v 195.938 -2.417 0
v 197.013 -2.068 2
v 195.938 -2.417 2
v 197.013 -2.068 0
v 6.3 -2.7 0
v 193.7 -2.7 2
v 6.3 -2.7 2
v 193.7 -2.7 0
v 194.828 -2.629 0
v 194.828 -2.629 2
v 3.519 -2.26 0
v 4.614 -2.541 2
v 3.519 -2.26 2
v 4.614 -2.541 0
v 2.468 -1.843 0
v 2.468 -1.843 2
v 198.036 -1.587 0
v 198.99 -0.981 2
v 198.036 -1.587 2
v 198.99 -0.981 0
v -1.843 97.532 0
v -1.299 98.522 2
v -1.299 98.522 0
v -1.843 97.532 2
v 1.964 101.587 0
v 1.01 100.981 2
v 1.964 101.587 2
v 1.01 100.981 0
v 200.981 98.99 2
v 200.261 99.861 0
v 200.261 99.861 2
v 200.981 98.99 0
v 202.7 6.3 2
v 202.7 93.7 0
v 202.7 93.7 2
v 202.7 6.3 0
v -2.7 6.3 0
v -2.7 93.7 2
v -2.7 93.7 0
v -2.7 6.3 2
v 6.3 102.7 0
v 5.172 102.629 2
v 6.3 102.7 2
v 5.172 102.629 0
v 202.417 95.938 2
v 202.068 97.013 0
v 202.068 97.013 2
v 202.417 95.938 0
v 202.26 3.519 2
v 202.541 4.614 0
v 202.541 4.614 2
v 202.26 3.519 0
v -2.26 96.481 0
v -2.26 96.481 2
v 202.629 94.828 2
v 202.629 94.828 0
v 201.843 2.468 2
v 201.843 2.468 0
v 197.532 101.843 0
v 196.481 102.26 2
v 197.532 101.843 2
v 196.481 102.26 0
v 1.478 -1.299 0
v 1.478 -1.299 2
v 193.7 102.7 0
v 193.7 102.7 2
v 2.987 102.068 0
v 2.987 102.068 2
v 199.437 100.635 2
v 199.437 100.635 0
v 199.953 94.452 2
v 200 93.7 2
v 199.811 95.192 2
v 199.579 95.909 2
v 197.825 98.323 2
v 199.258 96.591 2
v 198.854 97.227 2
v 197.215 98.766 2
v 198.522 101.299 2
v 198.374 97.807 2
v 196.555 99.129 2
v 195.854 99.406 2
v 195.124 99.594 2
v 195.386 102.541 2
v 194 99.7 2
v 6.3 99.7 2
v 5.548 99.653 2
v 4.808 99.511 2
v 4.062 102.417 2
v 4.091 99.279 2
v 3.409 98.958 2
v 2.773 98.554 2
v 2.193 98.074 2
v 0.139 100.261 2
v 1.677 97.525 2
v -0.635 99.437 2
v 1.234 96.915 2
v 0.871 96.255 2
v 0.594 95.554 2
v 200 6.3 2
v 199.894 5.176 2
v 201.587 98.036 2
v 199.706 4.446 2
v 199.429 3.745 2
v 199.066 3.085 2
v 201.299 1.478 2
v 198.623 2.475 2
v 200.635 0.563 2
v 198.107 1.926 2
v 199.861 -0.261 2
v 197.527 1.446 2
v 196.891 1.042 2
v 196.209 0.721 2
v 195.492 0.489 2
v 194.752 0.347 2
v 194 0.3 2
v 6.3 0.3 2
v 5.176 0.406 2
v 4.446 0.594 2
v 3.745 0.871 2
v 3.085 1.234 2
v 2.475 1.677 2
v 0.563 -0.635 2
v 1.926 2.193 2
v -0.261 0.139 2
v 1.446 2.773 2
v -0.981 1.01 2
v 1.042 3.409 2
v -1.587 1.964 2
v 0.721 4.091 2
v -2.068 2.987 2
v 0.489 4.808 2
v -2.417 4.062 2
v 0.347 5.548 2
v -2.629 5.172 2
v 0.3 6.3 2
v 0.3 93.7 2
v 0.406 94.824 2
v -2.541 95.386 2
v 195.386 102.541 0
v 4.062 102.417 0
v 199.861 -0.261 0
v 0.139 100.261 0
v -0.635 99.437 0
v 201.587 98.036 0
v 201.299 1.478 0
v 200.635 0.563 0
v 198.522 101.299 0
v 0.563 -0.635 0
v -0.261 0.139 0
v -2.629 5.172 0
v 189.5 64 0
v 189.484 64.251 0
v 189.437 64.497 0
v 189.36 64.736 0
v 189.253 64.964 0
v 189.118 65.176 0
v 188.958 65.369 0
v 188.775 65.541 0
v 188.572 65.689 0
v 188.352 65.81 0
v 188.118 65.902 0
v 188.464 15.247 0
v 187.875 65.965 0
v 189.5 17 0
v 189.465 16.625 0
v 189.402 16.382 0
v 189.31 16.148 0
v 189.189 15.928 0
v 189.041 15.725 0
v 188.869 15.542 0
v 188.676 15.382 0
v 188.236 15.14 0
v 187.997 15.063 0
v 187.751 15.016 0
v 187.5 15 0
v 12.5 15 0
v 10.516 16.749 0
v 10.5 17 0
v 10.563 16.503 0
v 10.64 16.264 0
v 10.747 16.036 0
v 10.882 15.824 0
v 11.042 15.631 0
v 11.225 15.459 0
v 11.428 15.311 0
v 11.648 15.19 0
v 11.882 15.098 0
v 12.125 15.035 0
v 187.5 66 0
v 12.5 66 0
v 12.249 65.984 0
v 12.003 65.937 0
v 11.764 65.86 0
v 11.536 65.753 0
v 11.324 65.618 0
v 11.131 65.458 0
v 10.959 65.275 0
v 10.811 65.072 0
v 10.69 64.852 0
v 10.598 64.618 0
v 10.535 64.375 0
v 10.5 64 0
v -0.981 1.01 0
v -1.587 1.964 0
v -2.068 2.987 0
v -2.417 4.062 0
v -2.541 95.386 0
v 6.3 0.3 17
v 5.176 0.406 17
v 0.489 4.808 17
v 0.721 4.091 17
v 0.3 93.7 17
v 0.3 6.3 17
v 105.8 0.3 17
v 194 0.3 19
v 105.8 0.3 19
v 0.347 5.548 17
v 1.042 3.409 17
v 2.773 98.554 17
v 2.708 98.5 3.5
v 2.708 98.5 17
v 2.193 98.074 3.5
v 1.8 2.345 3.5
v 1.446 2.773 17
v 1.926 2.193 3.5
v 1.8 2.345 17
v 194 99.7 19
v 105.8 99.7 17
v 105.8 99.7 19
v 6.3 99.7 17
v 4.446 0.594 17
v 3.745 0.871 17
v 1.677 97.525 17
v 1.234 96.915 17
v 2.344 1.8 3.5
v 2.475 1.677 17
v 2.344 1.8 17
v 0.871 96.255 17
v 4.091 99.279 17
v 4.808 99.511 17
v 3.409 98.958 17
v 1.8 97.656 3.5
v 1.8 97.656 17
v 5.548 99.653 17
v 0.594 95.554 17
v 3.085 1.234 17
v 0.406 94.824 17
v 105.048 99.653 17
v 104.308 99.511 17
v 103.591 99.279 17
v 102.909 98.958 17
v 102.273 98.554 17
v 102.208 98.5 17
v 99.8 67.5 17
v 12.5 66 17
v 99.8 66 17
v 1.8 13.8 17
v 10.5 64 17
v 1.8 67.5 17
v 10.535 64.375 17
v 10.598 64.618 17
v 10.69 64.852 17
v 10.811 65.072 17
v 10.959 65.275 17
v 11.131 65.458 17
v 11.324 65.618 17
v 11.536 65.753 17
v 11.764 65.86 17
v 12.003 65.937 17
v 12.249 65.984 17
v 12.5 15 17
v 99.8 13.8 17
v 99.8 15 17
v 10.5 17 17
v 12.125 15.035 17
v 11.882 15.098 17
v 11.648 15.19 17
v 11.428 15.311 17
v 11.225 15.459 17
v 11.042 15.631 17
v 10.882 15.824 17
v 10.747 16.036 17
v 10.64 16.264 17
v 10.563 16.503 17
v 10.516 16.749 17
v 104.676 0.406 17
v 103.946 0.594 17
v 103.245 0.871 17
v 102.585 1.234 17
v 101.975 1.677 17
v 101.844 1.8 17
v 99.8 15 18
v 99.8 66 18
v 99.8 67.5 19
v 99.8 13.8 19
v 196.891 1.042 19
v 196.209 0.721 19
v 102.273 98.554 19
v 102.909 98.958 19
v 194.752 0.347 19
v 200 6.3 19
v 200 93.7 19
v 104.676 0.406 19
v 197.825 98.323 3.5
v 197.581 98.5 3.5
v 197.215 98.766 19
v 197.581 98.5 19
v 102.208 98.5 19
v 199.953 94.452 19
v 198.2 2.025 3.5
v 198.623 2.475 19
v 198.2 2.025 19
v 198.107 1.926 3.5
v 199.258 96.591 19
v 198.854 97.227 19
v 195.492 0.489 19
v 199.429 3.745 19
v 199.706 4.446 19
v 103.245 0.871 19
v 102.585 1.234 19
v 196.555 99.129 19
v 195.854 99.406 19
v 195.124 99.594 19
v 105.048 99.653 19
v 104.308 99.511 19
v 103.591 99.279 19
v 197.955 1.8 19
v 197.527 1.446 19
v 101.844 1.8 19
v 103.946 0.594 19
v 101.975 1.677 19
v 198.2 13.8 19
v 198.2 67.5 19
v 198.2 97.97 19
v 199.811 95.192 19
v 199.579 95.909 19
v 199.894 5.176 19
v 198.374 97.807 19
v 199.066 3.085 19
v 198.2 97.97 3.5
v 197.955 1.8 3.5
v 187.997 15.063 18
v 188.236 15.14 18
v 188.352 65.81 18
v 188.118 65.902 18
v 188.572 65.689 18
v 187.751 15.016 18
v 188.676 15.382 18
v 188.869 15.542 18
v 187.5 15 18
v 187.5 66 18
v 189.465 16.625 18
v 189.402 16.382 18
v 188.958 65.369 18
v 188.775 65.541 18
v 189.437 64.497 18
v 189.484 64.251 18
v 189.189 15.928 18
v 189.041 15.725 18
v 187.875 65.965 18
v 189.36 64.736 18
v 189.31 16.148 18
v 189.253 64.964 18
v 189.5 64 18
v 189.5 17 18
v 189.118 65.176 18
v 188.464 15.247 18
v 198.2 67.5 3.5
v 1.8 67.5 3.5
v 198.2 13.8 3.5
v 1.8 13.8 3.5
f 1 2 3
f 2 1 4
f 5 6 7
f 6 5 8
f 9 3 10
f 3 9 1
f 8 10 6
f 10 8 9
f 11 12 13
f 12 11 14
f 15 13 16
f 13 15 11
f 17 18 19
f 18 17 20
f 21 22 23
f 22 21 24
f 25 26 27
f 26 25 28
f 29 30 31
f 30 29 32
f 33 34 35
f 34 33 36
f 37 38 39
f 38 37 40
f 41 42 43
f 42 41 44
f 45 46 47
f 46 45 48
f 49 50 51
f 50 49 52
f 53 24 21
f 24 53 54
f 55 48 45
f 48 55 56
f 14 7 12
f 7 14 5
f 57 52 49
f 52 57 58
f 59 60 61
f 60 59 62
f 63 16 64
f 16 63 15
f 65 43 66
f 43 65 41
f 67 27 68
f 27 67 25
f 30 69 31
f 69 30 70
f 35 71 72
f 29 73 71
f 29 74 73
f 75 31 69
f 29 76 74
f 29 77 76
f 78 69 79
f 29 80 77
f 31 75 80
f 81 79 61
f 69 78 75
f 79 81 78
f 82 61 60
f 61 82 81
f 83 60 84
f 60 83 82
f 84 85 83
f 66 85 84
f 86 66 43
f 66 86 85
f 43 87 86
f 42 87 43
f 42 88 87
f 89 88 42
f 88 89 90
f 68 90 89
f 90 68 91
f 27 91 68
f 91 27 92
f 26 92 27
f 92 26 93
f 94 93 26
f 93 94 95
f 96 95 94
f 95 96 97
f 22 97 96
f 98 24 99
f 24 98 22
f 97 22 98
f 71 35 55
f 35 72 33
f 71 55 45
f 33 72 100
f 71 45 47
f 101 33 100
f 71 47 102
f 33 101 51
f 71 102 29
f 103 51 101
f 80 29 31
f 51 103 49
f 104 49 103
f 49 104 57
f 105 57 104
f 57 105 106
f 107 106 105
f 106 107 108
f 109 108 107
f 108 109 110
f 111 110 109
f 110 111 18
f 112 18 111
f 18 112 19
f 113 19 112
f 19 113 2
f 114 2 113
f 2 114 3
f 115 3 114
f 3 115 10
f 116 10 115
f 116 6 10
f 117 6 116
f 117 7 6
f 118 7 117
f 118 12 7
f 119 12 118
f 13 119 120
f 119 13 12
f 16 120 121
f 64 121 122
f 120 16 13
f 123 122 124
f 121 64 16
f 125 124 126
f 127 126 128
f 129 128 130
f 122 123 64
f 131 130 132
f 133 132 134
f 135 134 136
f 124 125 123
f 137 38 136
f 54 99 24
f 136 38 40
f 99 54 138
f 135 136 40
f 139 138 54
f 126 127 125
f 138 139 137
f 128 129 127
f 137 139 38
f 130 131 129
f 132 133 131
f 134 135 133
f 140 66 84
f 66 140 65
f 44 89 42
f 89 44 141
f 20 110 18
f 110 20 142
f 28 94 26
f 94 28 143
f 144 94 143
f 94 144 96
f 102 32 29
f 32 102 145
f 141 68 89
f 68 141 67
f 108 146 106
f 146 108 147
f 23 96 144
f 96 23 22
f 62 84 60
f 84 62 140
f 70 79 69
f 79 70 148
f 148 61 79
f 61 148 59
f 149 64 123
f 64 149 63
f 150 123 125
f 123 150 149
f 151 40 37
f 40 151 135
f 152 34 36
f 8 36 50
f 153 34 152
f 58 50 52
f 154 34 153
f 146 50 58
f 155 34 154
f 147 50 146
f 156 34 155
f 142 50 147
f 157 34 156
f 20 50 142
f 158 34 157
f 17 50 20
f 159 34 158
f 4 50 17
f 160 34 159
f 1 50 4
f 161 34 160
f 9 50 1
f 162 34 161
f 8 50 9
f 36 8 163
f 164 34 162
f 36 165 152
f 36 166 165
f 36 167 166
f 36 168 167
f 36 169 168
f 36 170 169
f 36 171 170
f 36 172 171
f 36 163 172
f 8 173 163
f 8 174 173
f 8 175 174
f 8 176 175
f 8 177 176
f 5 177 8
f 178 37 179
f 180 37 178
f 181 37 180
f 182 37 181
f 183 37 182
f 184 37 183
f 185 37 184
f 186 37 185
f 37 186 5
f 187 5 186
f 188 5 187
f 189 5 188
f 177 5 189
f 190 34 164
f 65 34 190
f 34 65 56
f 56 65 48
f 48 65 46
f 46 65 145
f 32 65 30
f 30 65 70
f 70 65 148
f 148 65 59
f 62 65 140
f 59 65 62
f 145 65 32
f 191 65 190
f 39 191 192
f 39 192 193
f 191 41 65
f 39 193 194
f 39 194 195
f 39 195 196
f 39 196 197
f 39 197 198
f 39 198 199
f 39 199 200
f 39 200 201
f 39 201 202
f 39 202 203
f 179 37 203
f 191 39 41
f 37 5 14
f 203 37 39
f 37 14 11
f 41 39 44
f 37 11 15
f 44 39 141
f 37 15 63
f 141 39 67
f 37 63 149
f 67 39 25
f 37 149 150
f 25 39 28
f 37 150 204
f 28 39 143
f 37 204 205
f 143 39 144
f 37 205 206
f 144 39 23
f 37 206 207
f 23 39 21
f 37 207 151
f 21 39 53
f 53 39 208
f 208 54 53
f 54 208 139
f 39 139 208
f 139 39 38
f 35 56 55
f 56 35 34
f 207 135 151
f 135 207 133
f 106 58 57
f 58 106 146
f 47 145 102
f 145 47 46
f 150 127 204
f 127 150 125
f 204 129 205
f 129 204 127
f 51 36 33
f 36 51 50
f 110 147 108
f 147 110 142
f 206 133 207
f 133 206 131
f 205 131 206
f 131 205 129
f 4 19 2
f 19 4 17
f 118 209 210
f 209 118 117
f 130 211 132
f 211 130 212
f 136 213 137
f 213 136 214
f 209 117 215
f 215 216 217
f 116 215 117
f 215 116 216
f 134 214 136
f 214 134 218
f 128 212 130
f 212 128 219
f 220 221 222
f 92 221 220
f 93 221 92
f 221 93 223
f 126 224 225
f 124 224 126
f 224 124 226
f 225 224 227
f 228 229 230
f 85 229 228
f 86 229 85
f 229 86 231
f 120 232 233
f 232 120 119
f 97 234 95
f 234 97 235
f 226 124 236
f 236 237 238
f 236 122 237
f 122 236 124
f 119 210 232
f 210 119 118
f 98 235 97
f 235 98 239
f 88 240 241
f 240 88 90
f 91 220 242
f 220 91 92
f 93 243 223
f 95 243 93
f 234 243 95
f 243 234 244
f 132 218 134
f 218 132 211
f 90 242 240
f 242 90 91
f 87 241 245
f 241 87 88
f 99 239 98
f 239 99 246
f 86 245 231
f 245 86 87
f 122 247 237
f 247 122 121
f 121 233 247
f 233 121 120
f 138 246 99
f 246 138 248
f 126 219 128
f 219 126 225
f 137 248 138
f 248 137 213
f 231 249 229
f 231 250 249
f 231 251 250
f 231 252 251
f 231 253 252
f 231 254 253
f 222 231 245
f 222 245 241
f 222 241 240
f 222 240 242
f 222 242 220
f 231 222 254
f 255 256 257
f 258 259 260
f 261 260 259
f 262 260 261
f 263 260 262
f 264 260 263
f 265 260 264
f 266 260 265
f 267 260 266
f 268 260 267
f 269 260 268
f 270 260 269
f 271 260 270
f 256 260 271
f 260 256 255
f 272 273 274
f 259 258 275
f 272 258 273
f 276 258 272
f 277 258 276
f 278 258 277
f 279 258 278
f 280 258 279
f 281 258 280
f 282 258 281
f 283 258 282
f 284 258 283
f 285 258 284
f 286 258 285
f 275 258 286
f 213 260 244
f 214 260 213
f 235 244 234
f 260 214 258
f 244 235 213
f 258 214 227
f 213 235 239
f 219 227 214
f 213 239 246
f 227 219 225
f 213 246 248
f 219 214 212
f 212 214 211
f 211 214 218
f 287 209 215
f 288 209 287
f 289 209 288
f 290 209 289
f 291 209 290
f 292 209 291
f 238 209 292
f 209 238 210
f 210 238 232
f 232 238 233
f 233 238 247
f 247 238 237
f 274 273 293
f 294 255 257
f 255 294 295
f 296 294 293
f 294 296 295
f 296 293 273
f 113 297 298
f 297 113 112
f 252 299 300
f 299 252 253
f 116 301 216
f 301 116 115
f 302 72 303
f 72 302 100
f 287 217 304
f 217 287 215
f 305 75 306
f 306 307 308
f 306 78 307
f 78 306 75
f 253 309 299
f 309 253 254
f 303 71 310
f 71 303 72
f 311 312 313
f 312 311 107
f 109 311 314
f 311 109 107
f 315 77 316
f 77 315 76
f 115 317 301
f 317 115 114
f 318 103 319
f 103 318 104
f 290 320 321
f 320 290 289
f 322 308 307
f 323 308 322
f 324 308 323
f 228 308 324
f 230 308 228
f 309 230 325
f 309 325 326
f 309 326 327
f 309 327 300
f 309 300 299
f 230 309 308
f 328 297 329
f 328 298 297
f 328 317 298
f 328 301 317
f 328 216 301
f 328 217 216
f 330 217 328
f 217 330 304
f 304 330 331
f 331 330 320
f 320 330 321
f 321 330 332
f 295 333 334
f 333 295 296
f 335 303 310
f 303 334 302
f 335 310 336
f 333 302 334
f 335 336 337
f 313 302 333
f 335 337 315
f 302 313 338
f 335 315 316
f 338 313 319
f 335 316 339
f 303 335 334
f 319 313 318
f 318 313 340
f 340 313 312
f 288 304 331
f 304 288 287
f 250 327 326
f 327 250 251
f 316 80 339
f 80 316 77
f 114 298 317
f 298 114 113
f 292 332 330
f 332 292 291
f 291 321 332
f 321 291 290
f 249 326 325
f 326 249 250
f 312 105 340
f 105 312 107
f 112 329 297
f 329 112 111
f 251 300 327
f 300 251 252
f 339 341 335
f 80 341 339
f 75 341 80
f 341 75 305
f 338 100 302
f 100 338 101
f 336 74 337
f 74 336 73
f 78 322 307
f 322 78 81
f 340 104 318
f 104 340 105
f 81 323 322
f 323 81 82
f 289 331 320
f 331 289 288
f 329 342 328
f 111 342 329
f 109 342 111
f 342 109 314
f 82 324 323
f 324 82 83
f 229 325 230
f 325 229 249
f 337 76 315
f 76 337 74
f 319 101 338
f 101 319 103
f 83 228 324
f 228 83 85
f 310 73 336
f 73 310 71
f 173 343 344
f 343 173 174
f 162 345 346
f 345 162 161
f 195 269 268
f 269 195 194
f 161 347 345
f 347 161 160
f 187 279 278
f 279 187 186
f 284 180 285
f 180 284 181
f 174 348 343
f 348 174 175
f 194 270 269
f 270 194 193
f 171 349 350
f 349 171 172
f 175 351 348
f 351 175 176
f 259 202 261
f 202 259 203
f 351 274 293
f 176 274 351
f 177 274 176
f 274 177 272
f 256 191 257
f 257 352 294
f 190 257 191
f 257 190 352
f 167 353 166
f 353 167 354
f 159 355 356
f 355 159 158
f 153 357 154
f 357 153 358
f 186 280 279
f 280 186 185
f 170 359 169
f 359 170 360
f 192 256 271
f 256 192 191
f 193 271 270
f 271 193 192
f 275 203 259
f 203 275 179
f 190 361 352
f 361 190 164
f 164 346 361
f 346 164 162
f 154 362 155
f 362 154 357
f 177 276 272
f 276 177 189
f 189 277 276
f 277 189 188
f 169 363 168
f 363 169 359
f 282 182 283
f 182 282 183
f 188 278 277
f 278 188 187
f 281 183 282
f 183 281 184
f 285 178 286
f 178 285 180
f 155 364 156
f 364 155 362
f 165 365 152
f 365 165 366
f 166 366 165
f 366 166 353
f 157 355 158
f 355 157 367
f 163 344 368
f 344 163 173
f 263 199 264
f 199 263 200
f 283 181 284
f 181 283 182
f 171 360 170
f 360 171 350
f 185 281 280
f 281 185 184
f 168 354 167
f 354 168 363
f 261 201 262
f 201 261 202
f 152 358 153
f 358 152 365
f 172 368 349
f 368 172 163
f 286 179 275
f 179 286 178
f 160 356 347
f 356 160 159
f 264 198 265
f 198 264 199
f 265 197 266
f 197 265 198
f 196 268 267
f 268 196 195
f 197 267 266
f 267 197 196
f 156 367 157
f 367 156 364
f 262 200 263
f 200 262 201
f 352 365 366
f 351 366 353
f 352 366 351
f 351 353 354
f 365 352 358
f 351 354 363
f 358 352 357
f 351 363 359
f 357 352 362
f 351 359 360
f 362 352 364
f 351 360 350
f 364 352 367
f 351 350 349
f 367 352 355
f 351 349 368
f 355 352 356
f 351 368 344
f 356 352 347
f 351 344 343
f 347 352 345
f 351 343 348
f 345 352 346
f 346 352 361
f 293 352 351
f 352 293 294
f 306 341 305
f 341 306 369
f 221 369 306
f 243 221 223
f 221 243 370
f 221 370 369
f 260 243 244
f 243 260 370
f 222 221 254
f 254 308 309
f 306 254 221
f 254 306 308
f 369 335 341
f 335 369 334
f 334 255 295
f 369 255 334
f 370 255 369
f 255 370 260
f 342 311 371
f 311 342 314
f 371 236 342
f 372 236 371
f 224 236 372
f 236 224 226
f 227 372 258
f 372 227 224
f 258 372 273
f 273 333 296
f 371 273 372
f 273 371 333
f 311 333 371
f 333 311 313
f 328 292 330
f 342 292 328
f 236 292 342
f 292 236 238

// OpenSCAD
// Prado 2018 Radio Trim v5 — TEST FIT with L-shape fill
// Corrected from real test fit measurements (2026-03-11)
//
// Key corrections from v4 test fit:
// - Fascia opening: 200 × 100mm (not 205 × 104)
// - Body width: ~180mm (channel behind fascia is standard DIN width)
// - L-shaped side wings hug the Sony bracket (asymmetric left/right)
// - Body depth: max 15mm (before cavity widens)
// - din_y = 15mm (confirmed perfect)
// - Dash angle = 24° (measured, but kept flat for test fit)
//
// Print: flange face DOWN, 2 perimeters, 10% infill, ~30-40min

// ── Fascia Opening Dimensions ────────────────────────────────

// The actual opening in the gloss black fascia
fascia_w = 200;       // Confirmed: Aerpro FP9105 = 201mm, client = 20cm
fascia_h = 100;       // Confirmed: Aerpro FP9105 = 101mm, client = ~10cm

// Corner radius on fascia opening
fascia_r = 6;         // Reduced from 8mm — smaller opening means tighter radius

// ── DIN Cutout (Sony chassis hole) ───────────────────────────

din_w = 179;          // Sony 178mm + 1mm clearance
din_h = 51;           // Sony 50mm + 1mm clearance
din_r = 2;

// DIN position (measured from bottom-left of fascia opening)
din_x = (fascia_w - din_w) / 2;   // ~10.5mm centered
din_y = 15;                        // Confirmed perfect from test fit

// ── L-Shaped Side Fill (hugs Sony bracket) ───────────────────
// These fill the step between the narrow DIN area and the wide fascia opening
// Measured at the car — ASYMMETRIC left vs right

// Left side L-shape
l_shelf_w = 22;       // Horizontal shelf width (mm)
l_shelf_d = 15;       // Vertical depth of the shelf (mm)

// Right side L-shape
r_shelf_w = 23;       // Horizontal shelf width (mm)
r_shelf_d = 17;       // Vertical depth of the shelf (mm)

// ── Body Dimensions ──────────────────────────────────────────

body_depth = 15;      // Max depth before cavity widens (measured 1.5cm)
flange_overhang = 3;  // Reduced — fascia opening is tighter
flange_t = 2;         // Flange thickness (test fit = thin)

wall = 1.5;           // Thin walls for test fit
tol = 0.3;            // Tighter tolerance for better fit test

// ── Modules ──────────────────────────────────────────────────

$fn = 50;

module rounded_rect_2d(w, h, r) {
    offset(r) offset(-r)
        square([w, h]);
}

// ── Main Trim ────────────────────────────────────────────────

module trim_v5() {

    // Calculate inner body width (channel behind fascia)
    // The body that slides in is narrower than the fascia opening
    // It matches the space between the L-shelf inner edges
    body_w = fascia_w - l_shelf_w - r_shelf_w;  // 200 - 22 - 23 = 155mm
    body_h = fascia_h;  // Full height for now

    // Body X offset (left shelf pushes body to the right)
    body_x = l_shelf_w;

    difference() {
        union() {
            // ── 1. Front flange (sits on fascia surface) ──
            translate([-(flange_overhang - tol), -(flange_overhang - tol), 0])
            linear_extrude(flange_t)
                rounded_rect_2d(
                    fascia_w + flange_overhang*2 - tol*2,
                    fascia_h + flange_overhang*2 - tol*2,
                    fascia_r + flange_overhang
                );

            // ── 2. Face plate (fills the fascia opening) ──
            // This is the visible front face, full fascia width
            translate([tol, tol, flange_t])
            linear_extrude(wall)  // Just one wall thickness deep
                rounded_rect_2d(fascia_w - tol*2, fascia_h - tol*2, fascia_r);

            // ── 3. Narrow body (slides into the channel) ──
            // Only the narrow center section goes deep
            translate([body_x + tol, tol, flange_t])
            linear_extrude(body_depth)
                rounded_rect_2d(body_w - tol*2, body_h - tol*2, 2);

            // ── 4. Left L-shaped wing ──
            // Horizontal shelf: extends from body left edge toward fascia left edge
            // Depth: l_shelf_d (15mm)
            translate([tol, tol, flange_t])
            linear_extrude(l_shelf_d)
                rounded_rect_2d(l_shelf_w + body_w/2, fascia_h - tol*2, fascia_r);

            // ── 5. Right L-shaped wing ──
            // Horizontal shelf: extends from body right edge toward fascia right edge
            // Depth: r_shelf_d (17mm)
            translate([body_x + body_w/2 + tol, tol, flange_t])
            linear_extrude(r_shelf_d)
                rounded_rect_2d(r_shelf_w + body_w/2 - tol, fascia_h - tol*2, fascia_r);
        }

        // ── DIN cutout (all the way through) ──
        translate([din_x, din_y, -1])
        linear_extrude(body_depth + flange_t + 2)
            rounded_rect_2d(din_w, din_h, din_r);

        // ── Hollow out to save material ──
        // Hollow the face plate area (above and below DIN)
        // Above DIN
        translate([wall + tol, din_y + din_h + wall, flange_t + wall])
        linear_extrude(body_depth + 1)
            square([fascia_w - wall*2 - tol*2, fascia_h - din_y - din_h - wall*2]);

        // Below DIN (if there's enough space)
        if (din_y > wall * 3) {
            translate([wall + tol, wall + tol, flange_t + wall])
            linear_extrude(body_depth + 1)
                square([fascia_w - wall*2 - tol*2, din_y - wall*2]);
        }

        // Left side hollow (between DIN and left wall, behind the L-shelf)
        translate([wall + tol, wall + tol, flange_t + max(l_shelf_d, r_shelf_d) + wall])
        linear_extrude(body_depth + 1)
            square([din_x - wall*2, fascia_h - wall*2 - tol*2]);

        // Right side hollow
        translate([din_x + din_w + wall, wall + tol, flange_t + max(l_shelf_d, r_shelf_d) + wall])
        linear_extrude(body_depth + 1)
            square([fascia_w - din_x - din_w - wall*2 - tol, fascia_h - wall*2 - tol*2]);
    }
}

trim_v5();
